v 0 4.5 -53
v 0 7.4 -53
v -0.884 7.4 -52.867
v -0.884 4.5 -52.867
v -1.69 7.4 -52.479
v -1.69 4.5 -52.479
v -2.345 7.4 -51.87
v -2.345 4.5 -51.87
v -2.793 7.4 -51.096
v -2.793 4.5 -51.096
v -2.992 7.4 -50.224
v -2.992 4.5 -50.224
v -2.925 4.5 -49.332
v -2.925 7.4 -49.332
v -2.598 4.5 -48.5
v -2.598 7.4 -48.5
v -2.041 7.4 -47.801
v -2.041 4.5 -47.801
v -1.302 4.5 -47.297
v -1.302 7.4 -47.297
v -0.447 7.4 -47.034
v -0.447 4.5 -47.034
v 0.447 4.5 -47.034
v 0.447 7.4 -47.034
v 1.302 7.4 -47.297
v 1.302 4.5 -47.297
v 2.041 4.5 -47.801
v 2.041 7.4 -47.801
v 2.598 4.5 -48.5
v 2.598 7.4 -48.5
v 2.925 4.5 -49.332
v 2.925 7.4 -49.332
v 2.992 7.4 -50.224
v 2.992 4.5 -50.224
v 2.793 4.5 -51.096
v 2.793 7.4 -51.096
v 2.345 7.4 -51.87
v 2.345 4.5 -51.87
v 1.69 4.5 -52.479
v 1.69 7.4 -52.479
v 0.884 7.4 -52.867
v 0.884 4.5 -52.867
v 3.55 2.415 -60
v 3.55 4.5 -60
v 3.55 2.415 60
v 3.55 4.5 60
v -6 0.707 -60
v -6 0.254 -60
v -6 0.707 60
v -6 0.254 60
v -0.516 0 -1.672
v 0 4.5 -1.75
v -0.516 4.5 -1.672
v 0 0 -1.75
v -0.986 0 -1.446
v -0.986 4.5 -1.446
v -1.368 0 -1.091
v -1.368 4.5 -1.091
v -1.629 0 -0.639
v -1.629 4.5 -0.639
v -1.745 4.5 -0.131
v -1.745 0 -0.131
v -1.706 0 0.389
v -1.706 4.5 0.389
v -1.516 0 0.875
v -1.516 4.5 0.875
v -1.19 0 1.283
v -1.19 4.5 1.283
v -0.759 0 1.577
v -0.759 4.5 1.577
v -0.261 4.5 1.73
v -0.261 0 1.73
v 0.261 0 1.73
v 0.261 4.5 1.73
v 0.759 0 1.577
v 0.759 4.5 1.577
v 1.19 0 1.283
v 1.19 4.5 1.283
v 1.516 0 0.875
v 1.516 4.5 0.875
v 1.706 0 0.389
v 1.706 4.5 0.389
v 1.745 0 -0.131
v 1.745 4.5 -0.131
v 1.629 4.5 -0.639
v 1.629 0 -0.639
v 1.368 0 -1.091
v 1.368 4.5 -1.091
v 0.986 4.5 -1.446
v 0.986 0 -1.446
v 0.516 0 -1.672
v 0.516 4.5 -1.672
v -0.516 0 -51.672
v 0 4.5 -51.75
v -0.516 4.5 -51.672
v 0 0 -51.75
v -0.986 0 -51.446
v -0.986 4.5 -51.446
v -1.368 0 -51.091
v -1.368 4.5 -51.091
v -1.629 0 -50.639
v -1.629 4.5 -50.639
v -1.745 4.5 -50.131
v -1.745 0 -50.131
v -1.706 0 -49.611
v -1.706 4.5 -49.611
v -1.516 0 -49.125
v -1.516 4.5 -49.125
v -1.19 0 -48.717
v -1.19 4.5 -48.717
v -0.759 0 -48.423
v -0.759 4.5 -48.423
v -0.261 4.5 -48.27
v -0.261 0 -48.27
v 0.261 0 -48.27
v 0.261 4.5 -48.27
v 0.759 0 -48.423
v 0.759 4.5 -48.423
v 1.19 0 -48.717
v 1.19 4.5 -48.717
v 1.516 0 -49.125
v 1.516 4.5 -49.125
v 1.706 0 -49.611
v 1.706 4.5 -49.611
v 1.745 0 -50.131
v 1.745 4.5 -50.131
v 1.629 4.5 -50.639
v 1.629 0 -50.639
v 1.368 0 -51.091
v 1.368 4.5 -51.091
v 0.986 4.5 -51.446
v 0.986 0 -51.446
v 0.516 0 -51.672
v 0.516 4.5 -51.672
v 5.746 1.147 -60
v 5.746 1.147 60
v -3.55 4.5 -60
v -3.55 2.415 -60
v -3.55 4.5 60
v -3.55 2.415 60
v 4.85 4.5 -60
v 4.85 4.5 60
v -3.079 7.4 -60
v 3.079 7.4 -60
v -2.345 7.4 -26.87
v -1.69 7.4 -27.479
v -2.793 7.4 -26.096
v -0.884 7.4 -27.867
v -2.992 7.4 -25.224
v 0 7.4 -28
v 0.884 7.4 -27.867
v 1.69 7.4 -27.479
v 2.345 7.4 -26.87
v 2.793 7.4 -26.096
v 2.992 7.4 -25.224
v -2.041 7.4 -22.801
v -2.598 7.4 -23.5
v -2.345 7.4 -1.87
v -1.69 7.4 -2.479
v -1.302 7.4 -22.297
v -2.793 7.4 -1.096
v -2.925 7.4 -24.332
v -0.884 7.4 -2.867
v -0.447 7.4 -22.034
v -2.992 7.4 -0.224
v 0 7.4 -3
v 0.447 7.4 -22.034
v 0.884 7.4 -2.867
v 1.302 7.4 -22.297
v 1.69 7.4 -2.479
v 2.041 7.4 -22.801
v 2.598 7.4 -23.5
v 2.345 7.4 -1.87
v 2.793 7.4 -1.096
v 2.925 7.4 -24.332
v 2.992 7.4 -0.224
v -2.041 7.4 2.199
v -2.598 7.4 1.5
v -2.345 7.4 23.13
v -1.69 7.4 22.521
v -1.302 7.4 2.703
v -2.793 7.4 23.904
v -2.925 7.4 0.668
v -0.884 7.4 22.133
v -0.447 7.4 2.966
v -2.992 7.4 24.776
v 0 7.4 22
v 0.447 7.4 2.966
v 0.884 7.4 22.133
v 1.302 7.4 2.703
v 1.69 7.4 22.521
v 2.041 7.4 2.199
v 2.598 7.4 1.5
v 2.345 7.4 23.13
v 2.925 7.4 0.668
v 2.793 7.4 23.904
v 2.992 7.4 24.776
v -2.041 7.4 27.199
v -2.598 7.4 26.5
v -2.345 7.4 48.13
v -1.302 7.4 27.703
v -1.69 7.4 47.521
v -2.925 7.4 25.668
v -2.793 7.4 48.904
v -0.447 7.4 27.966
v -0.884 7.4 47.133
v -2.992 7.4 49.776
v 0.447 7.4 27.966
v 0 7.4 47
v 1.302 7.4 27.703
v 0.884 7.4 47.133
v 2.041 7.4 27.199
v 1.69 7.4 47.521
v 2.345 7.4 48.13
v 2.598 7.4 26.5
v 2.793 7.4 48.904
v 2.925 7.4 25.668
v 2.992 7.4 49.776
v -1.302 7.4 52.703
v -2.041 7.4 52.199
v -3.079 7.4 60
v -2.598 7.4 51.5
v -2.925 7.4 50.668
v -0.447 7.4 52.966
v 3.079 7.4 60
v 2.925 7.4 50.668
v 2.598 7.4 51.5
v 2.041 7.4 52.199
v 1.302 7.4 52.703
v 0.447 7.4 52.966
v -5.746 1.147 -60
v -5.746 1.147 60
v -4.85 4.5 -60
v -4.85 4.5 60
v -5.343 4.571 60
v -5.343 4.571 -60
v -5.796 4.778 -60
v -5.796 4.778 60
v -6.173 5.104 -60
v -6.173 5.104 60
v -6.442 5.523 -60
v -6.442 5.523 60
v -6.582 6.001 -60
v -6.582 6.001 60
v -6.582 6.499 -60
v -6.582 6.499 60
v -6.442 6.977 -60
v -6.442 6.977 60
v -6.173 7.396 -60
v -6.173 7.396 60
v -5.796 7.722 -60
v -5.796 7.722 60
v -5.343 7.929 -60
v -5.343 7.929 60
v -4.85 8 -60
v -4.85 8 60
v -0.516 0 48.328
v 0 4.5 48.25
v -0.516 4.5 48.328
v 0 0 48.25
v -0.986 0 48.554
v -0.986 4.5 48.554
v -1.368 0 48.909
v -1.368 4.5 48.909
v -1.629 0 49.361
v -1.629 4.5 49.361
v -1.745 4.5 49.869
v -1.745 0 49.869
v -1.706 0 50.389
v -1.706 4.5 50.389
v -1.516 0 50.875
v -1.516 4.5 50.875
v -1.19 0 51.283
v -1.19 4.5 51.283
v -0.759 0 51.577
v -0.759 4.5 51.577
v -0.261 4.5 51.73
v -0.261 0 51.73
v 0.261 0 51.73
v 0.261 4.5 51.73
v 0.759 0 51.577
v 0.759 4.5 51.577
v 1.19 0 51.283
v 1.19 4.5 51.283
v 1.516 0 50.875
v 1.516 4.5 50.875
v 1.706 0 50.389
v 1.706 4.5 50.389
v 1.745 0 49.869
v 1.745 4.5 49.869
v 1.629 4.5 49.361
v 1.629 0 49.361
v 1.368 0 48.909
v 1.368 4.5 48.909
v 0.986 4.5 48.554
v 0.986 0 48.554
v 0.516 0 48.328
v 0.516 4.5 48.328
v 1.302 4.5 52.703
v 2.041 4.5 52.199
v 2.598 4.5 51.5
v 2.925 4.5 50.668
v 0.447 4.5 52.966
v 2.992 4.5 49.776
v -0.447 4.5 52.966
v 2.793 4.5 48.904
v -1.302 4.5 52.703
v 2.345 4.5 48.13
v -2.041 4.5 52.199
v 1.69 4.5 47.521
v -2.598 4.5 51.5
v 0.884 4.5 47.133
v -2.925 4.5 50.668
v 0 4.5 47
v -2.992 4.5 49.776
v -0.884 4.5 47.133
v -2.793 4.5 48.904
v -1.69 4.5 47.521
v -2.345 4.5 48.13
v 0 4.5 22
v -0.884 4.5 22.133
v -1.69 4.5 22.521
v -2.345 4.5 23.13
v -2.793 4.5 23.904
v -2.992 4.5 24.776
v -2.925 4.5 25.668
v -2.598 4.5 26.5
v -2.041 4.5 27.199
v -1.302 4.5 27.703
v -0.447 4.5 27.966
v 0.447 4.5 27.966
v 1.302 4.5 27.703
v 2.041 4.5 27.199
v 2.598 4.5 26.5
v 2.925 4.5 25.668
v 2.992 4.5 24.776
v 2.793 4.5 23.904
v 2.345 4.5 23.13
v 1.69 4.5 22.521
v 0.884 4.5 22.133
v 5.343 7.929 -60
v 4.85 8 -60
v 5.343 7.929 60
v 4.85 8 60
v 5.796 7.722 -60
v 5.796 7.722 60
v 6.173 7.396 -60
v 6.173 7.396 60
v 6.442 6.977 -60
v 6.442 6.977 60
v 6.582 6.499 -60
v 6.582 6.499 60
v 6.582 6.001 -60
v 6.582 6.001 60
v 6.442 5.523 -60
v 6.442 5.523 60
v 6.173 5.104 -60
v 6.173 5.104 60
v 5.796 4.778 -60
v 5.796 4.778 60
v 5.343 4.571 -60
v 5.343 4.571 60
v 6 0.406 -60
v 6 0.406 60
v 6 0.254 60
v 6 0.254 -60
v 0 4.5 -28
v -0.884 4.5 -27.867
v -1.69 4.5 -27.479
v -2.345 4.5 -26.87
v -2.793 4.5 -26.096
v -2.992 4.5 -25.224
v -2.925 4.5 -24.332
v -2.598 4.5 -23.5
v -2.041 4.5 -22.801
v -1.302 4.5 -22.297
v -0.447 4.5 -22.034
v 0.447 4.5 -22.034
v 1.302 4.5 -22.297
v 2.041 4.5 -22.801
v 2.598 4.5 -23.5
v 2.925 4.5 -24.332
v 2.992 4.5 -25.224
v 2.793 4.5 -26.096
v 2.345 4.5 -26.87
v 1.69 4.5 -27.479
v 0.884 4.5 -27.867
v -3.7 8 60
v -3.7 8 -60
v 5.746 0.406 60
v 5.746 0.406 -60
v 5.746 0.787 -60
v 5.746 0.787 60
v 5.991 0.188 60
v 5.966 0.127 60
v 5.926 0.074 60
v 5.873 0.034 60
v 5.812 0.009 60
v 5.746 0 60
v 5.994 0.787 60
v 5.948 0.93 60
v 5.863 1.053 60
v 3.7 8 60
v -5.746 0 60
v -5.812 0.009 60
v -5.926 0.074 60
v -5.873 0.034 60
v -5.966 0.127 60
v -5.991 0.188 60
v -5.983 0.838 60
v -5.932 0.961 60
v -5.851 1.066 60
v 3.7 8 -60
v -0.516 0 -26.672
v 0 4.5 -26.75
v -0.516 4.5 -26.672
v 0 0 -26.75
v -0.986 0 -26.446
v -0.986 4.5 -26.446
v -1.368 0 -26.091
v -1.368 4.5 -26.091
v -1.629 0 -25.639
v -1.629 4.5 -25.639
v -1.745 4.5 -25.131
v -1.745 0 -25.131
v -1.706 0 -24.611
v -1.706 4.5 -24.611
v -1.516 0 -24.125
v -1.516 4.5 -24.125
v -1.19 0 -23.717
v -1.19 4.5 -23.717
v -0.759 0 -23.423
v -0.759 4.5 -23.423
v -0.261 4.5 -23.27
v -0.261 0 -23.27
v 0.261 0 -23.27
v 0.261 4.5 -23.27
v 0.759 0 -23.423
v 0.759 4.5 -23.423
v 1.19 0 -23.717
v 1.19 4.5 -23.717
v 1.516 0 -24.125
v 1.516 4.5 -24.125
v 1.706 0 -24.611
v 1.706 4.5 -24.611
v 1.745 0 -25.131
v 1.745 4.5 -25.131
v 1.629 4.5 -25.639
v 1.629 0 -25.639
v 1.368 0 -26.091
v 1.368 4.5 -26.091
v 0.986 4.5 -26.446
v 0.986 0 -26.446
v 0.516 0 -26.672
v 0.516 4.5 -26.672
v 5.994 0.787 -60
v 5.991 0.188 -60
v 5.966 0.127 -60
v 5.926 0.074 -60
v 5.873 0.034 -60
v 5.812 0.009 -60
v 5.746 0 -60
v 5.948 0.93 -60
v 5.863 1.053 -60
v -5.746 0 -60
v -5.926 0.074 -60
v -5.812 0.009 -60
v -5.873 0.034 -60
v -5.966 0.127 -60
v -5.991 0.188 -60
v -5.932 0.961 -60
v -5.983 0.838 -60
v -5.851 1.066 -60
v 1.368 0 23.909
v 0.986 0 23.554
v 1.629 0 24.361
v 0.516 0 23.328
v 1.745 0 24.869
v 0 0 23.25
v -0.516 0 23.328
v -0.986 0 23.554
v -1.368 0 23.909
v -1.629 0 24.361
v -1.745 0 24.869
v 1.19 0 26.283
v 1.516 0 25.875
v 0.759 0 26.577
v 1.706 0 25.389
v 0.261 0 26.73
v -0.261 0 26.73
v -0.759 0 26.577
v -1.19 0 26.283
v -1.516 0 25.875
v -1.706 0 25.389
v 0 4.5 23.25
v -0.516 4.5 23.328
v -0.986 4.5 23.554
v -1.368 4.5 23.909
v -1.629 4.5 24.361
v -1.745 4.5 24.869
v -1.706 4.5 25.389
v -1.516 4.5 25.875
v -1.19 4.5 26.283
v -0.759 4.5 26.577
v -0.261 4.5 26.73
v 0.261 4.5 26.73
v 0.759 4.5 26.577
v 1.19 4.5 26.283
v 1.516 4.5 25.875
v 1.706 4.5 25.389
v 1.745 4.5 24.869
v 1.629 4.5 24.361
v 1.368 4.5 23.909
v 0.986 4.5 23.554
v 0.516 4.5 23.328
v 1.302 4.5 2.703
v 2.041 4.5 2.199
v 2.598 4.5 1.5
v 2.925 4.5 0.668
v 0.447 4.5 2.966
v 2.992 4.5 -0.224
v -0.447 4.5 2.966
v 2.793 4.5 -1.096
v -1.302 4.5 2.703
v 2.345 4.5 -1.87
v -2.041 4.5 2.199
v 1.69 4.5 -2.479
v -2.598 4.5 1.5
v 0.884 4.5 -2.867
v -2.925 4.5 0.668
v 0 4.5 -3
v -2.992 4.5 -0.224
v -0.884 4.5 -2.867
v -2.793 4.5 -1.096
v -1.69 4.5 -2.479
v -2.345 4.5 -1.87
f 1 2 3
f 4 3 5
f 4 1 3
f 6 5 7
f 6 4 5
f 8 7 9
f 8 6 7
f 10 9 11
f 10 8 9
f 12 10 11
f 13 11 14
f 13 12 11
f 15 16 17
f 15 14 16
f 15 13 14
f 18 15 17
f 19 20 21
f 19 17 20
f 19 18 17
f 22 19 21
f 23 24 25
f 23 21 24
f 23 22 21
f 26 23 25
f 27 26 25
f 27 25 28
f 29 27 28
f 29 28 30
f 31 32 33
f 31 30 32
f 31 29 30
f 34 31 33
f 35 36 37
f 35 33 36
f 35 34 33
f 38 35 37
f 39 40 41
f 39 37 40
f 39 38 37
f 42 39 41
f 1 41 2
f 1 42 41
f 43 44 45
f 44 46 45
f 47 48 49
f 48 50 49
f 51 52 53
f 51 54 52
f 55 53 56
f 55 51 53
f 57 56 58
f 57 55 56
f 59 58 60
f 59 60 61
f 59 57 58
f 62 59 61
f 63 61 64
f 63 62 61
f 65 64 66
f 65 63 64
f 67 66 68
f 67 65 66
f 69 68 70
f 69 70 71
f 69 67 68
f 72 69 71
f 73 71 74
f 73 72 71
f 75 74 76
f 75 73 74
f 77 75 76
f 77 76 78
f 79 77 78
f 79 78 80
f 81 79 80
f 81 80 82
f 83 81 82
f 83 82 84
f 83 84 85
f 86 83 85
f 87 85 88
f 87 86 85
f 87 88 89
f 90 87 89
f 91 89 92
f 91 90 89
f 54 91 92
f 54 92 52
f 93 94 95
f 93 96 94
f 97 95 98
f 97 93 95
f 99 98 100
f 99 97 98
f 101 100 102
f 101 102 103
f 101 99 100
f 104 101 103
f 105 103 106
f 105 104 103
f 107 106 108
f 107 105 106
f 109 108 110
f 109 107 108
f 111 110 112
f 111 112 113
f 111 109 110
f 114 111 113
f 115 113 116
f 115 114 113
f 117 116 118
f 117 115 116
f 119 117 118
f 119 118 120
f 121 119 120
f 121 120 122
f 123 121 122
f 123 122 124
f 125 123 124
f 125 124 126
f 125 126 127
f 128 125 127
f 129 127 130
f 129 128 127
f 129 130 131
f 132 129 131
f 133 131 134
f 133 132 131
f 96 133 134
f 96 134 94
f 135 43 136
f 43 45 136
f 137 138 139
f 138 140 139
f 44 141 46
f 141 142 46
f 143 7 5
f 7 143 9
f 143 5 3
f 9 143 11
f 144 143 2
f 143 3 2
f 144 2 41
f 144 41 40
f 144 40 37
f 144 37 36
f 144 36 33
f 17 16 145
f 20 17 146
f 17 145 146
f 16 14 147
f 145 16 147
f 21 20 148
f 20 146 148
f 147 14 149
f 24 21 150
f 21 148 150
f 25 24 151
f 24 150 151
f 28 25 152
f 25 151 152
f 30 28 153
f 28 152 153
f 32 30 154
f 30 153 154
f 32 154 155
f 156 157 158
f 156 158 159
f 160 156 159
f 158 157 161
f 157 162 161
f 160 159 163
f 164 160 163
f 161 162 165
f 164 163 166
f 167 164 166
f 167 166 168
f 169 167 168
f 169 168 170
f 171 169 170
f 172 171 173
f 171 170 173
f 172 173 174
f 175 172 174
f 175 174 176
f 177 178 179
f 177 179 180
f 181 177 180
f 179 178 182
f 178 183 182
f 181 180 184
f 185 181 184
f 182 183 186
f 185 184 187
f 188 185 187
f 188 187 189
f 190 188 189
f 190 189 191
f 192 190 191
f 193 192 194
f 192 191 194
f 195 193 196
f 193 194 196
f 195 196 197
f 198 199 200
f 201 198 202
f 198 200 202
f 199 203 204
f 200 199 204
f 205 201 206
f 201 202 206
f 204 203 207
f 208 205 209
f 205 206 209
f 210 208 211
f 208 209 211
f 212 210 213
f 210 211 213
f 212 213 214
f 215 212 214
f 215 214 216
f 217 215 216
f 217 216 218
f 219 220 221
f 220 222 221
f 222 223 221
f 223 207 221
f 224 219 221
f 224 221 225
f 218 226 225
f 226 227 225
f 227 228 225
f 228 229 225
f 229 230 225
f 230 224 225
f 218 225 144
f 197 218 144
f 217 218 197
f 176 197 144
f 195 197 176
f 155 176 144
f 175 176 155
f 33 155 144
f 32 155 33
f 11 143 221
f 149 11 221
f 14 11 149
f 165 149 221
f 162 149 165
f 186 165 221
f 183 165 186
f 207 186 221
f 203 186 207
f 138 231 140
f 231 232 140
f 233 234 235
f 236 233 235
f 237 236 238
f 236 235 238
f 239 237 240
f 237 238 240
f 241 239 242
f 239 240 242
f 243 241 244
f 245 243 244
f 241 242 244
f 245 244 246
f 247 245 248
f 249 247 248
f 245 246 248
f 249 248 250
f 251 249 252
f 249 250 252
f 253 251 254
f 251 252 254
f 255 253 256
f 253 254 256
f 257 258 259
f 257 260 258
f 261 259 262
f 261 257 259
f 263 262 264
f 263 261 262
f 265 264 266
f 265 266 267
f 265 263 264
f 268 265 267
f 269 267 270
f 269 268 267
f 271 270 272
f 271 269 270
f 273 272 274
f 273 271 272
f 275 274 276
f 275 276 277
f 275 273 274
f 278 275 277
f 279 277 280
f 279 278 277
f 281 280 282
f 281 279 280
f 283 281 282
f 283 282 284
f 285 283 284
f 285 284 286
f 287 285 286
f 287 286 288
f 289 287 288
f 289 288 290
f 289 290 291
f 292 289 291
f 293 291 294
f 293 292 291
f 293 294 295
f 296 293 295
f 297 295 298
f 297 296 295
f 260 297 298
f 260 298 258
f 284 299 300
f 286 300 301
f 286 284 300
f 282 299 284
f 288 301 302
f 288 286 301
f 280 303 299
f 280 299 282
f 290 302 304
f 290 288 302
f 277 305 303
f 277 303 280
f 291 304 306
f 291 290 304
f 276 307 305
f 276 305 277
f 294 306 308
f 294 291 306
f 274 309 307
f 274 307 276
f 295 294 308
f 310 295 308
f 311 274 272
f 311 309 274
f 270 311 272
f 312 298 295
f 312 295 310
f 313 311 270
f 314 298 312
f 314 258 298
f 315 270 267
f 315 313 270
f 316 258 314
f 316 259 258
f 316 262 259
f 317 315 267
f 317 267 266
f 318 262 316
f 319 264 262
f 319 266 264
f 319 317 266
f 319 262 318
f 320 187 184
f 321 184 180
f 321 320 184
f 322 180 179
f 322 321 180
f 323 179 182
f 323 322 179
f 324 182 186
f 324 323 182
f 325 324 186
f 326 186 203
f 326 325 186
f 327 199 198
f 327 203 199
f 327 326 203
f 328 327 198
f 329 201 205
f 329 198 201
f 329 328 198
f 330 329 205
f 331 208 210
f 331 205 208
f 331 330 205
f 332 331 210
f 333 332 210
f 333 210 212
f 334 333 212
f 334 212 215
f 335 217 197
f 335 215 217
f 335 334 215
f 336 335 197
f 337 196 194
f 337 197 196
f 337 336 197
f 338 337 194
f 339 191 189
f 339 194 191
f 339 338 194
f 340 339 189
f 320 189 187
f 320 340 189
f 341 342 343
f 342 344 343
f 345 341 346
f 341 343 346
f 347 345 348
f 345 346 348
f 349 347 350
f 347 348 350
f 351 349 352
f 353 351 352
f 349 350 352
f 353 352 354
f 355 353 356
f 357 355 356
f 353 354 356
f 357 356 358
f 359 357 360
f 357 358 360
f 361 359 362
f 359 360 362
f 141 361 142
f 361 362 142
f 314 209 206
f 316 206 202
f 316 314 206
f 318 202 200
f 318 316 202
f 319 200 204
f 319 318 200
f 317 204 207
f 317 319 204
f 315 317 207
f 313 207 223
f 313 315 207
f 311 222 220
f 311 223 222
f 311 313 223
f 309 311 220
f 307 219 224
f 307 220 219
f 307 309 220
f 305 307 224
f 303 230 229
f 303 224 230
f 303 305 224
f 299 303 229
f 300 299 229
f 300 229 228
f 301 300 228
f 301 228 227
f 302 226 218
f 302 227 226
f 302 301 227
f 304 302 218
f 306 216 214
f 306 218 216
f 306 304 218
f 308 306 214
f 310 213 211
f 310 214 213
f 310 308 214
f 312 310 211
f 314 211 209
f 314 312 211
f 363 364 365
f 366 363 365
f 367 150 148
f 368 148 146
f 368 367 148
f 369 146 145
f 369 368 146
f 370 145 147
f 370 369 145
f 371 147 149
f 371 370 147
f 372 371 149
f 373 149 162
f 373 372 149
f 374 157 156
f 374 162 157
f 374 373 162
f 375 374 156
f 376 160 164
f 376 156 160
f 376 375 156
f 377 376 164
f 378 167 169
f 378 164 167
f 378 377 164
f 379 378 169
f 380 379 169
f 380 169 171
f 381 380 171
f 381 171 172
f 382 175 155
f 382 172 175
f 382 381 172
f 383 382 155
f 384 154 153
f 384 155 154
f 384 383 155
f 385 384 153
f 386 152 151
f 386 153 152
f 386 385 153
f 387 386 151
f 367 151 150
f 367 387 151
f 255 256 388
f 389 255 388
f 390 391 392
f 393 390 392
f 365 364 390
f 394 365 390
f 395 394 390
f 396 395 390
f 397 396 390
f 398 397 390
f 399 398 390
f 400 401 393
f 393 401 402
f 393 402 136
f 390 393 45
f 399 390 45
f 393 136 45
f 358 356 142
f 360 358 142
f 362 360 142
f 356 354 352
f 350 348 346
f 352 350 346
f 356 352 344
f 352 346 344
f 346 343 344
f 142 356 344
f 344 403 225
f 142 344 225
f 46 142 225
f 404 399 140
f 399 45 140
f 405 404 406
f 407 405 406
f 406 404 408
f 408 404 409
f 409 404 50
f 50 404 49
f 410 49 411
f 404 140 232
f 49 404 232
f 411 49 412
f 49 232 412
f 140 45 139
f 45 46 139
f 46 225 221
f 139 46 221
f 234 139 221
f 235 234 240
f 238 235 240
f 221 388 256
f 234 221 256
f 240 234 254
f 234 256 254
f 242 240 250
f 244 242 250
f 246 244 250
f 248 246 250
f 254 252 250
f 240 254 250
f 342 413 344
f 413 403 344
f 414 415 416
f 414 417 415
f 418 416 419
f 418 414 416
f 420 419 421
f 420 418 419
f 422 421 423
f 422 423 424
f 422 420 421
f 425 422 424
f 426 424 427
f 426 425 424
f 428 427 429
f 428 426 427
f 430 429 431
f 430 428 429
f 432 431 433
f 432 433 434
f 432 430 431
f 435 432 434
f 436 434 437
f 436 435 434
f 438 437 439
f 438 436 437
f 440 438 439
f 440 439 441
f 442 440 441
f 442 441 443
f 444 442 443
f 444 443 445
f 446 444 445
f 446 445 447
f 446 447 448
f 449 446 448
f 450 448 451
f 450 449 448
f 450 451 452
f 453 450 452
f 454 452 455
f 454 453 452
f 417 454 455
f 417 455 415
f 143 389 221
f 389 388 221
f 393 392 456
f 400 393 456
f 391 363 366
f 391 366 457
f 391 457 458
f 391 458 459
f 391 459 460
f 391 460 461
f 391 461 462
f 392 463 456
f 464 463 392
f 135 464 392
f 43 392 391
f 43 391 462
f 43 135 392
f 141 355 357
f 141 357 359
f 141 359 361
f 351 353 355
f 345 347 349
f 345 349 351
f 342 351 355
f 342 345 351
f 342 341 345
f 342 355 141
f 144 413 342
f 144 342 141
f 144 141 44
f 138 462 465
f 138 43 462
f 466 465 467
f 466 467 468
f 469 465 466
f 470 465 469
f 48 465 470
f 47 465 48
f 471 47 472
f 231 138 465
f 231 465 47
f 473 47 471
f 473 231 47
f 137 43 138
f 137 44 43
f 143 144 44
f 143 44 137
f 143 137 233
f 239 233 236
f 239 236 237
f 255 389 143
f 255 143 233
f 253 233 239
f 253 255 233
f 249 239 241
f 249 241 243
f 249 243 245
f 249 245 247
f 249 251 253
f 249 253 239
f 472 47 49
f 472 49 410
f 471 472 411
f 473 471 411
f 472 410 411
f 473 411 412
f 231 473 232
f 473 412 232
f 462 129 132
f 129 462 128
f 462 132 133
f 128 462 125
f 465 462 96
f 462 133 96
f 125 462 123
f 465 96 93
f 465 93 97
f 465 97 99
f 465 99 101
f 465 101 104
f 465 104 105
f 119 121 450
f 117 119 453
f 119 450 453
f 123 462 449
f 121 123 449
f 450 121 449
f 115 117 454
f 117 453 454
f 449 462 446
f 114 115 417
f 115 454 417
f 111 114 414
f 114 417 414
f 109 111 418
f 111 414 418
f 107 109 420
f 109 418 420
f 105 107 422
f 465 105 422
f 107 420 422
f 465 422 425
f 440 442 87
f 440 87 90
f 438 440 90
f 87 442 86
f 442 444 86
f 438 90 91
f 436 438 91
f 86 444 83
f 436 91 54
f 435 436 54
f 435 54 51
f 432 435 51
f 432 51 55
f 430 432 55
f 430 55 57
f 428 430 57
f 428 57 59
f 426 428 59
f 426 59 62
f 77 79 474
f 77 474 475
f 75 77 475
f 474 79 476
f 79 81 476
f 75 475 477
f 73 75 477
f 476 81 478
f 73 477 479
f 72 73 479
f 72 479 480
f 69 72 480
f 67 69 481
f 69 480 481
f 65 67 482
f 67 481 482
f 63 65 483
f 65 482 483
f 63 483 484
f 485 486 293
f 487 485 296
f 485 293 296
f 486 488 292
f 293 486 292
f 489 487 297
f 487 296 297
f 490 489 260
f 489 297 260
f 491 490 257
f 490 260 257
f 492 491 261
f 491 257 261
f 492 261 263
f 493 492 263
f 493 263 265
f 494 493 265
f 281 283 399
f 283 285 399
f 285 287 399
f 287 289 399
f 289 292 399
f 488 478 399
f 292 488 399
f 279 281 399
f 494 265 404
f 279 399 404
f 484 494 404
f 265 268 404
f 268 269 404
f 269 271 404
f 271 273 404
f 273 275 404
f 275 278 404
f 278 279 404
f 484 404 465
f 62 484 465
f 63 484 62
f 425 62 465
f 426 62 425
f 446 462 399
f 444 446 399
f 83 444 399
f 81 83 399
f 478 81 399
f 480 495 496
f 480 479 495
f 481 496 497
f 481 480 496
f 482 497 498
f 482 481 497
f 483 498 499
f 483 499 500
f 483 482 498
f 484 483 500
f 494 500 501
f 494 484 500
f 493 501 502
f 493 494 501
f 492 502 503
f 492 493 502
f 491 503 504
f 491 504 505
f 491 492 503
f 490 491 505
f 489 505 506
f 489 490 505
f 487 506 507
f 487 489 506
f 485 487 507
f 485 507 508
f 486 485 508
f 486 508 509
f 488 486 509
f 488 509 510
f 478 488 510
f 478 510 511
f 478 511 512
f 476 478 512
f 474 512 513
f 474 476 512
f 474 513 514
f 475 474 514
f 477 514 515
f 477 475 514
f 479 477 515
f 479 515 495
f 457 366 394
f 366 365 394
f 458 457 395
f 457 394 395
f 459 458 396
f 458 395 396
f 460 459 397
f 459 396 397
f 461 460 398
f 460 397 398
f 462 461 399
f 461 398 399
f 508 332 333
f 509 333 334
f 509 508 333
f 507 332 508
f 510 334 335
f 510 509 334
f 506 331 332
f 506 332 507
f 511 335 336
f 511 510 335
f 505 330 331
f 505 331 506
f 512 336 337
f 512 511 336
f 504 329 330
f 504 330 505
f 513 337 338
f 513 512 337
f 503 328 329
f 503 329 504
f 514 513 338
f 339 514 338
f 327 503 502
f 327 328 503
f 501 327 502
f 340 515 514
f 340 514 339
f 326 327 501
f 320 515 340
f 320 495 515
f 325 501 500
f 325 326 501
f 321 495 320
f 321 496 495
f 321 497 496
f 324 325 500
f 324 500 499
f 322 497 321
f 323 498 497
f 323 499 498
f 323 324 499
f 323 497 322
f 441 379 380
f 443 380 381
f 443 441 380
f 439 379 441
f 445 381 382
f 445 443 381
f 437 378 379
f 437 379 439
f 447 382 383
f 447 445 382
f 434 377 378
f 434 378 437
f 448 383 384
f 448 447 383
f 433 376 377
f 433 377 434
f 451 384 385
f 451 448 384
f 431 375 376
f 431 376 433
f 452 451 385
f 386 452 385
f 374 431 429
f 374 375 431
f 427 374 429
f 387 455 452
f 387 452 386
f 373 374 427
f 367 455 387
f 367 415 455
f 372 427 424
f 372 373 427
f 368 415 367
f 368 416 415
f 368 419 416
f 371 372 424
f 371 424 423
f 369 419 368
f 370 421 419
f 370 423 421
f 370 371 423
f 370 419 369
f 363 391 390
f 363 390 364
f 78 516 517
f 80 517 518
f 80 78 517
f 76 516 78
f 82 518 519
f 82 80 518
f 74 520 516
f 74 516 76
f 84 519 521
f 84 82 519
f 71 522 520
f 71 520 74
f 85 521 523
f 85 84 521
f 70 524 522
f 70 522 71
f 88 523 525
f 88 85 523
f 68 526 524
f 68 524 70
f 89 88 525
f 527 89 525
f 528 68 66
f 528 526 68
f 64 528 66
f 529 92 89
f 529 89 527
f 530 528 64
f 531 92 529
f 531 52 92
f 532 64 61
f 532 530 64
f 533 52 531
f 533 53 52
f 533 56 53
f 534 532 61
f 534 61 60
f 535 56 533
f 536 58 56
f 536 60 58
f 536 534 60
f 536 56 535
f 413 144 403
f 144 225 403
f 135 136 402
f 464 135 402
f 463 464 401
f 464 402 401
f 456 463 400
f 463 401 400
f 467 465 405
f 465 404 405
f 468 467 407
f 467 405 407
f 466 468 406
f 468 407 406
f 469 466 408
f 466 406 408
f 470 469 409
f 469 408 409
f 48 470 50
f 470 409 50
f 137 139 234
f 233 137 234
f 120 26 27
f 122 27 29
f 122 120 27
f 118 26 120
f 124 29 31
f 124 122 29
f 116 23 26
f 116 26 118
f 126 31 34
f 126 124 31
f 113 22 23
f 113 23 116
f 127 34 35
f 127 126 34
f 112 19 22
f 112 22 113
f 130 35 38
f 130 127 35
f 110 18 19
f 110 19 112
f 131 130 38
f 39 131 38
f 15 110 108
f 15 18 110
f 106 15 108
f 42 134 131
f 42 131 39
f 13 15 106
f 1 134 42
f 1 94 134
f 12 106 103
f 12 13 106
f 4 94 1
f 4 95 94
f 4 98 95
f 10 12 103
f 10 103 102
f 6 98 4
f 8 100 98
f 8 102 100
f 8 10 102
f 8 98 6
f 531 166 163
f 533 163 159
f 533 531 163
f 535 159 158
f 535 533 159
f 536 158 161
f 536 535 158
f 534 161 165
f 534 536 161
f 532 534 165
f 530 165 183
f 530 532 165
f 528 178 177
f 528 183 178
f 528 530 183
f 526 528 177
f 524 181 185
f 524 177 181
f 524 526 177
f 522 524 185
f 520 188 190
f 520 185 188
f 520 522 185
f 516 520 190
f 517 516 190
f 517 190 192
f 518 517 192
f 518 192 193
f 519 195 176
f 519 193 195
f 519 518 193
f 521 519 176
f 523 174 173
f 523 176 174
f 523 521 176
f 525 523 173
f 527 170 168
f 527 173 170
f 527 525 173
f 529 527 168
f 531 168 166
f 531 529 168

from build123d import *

# Parameters (mm, degrees)
BOSS_EXTRUDE1_DEPTH     = 60
CUT_EXTRUDE1_DEPTH      = 61.889736409
CUT_EXTRUDE1_DEPTH_BACK = 61.889736409
SKETCH4_W               = 0.254
SKETCH4_H               = 0.381
LPATTERN2_COUNT         = 5
LPATTERN2_PITCH         = 25


with BuildPart() as part:
    # Sketch1 → Boss-Extrude1 (new, symmetric)
    with BuildSketch(Plane.XY):
        with BuildLine():
            Line((-4.85, 8), (-3.7, 8))
            Line((-3.7, 8), (-3.078681812, 7.4))
            Line((-3.078681812, 7.4), (3.078681812, 7.4))
            Line((3.078681812, 7.4), (3.7, 8))
            Line((3.7, 8), (4.85, 8))
            ThreePointArc((4.85, 8), (6.6, 6.25), (4.85, 4.5))
            Line((4.85, 4.5), (3.55, 4.5))
            Line((3.55, 4.5), (3.55, 2.41450816))
            Line((3.55, 2.41450816), (5.746, 1.146646968))
            ThreePointArc((5.746, 1.146646968), (5.931940905, 0.960706063), (6, 0.706706063))
            Line((6, 0.706706063), (6, 0.254))
            ThreePointArc((6, 0.254), (5.925605122, 0.074394878), (5.746, 0))
            Line((5.746, 0), (-5.746, 0))
            ThreePointArc((-5.746, 0), (-5.925605122, 0.074394878), (-6, 0.254))
            Line((-6, 0.254), (-6, 0.706706063))
            ThreePointArc((-6, 0.706706063), (-5.931940905, 0.960706063), (-5.746, 1.146646968))
            Line((-5.746, 1.146646968), (-3.55, 2.41450816))
            Line((-3.55, 2.41450816), (-3.55, 4.5))
            Line((-3.55, 4.5), (-4.85, 4.5))
            ThreePointArc((-4.85, 4.5), (-6.6, 6.25), (-4.85, 8))
        make_face()
    extrude(amount=BOSS_EXTRUDE1_DEPTH, both=True)

    # Sketch4 → Cut-Extrude1 (cut, two sides: drawn at the far end of the back side and taken through both)
    with BuildSketch(Plane.XY.offset(-CUT_EXTRUDE1_DEPTH_BACK)):
        with Locations((5.873, 0.5969)):
            Rectangle(SKETCH4_W, SKETCH4_H)
    extrude(amount=CUT_EXTRUDE1_DEPTH + CUT_EXTRUDE1_DEPTH_BACK, mode=Mode.SUBTRACT)

    # Sketch2 → Cut-Revolve1 (revolve, cut)
    with BuildSketch(Plane(origin=(0, 0, 0), x_dir=(0, 0, -1), z_dir=(1, 0, 0)), mode=Mode.PRIVATE) as cut_revolve1_sk:
        Polygon((-53, 7.4), (-53, 4.5), (-51.75, 4.5), (-51.75, 0), (-50, 0), (-50, 7.4), (-50, 8), (-53, 8), align=None)
    cut_revolve1 = revolve(cut_revolve1_sk.sketch.rotate(Axis((0, 0, 50), (0, 1, 0)), 180), axis=Axis((0, 0, 50), (0, 1, 0)), mode=Mode.SUBTRACT)

    # LPattern2: Cut-Revolve1 ×5
    with Locations(*[(0, 0, -i * LPATTERN2_PITCH) for i in range(1, LPATTERN2_COUNT)]):
        add(cut_revolve1, mode=Mode.SUBTRACT)


solid = part.part
